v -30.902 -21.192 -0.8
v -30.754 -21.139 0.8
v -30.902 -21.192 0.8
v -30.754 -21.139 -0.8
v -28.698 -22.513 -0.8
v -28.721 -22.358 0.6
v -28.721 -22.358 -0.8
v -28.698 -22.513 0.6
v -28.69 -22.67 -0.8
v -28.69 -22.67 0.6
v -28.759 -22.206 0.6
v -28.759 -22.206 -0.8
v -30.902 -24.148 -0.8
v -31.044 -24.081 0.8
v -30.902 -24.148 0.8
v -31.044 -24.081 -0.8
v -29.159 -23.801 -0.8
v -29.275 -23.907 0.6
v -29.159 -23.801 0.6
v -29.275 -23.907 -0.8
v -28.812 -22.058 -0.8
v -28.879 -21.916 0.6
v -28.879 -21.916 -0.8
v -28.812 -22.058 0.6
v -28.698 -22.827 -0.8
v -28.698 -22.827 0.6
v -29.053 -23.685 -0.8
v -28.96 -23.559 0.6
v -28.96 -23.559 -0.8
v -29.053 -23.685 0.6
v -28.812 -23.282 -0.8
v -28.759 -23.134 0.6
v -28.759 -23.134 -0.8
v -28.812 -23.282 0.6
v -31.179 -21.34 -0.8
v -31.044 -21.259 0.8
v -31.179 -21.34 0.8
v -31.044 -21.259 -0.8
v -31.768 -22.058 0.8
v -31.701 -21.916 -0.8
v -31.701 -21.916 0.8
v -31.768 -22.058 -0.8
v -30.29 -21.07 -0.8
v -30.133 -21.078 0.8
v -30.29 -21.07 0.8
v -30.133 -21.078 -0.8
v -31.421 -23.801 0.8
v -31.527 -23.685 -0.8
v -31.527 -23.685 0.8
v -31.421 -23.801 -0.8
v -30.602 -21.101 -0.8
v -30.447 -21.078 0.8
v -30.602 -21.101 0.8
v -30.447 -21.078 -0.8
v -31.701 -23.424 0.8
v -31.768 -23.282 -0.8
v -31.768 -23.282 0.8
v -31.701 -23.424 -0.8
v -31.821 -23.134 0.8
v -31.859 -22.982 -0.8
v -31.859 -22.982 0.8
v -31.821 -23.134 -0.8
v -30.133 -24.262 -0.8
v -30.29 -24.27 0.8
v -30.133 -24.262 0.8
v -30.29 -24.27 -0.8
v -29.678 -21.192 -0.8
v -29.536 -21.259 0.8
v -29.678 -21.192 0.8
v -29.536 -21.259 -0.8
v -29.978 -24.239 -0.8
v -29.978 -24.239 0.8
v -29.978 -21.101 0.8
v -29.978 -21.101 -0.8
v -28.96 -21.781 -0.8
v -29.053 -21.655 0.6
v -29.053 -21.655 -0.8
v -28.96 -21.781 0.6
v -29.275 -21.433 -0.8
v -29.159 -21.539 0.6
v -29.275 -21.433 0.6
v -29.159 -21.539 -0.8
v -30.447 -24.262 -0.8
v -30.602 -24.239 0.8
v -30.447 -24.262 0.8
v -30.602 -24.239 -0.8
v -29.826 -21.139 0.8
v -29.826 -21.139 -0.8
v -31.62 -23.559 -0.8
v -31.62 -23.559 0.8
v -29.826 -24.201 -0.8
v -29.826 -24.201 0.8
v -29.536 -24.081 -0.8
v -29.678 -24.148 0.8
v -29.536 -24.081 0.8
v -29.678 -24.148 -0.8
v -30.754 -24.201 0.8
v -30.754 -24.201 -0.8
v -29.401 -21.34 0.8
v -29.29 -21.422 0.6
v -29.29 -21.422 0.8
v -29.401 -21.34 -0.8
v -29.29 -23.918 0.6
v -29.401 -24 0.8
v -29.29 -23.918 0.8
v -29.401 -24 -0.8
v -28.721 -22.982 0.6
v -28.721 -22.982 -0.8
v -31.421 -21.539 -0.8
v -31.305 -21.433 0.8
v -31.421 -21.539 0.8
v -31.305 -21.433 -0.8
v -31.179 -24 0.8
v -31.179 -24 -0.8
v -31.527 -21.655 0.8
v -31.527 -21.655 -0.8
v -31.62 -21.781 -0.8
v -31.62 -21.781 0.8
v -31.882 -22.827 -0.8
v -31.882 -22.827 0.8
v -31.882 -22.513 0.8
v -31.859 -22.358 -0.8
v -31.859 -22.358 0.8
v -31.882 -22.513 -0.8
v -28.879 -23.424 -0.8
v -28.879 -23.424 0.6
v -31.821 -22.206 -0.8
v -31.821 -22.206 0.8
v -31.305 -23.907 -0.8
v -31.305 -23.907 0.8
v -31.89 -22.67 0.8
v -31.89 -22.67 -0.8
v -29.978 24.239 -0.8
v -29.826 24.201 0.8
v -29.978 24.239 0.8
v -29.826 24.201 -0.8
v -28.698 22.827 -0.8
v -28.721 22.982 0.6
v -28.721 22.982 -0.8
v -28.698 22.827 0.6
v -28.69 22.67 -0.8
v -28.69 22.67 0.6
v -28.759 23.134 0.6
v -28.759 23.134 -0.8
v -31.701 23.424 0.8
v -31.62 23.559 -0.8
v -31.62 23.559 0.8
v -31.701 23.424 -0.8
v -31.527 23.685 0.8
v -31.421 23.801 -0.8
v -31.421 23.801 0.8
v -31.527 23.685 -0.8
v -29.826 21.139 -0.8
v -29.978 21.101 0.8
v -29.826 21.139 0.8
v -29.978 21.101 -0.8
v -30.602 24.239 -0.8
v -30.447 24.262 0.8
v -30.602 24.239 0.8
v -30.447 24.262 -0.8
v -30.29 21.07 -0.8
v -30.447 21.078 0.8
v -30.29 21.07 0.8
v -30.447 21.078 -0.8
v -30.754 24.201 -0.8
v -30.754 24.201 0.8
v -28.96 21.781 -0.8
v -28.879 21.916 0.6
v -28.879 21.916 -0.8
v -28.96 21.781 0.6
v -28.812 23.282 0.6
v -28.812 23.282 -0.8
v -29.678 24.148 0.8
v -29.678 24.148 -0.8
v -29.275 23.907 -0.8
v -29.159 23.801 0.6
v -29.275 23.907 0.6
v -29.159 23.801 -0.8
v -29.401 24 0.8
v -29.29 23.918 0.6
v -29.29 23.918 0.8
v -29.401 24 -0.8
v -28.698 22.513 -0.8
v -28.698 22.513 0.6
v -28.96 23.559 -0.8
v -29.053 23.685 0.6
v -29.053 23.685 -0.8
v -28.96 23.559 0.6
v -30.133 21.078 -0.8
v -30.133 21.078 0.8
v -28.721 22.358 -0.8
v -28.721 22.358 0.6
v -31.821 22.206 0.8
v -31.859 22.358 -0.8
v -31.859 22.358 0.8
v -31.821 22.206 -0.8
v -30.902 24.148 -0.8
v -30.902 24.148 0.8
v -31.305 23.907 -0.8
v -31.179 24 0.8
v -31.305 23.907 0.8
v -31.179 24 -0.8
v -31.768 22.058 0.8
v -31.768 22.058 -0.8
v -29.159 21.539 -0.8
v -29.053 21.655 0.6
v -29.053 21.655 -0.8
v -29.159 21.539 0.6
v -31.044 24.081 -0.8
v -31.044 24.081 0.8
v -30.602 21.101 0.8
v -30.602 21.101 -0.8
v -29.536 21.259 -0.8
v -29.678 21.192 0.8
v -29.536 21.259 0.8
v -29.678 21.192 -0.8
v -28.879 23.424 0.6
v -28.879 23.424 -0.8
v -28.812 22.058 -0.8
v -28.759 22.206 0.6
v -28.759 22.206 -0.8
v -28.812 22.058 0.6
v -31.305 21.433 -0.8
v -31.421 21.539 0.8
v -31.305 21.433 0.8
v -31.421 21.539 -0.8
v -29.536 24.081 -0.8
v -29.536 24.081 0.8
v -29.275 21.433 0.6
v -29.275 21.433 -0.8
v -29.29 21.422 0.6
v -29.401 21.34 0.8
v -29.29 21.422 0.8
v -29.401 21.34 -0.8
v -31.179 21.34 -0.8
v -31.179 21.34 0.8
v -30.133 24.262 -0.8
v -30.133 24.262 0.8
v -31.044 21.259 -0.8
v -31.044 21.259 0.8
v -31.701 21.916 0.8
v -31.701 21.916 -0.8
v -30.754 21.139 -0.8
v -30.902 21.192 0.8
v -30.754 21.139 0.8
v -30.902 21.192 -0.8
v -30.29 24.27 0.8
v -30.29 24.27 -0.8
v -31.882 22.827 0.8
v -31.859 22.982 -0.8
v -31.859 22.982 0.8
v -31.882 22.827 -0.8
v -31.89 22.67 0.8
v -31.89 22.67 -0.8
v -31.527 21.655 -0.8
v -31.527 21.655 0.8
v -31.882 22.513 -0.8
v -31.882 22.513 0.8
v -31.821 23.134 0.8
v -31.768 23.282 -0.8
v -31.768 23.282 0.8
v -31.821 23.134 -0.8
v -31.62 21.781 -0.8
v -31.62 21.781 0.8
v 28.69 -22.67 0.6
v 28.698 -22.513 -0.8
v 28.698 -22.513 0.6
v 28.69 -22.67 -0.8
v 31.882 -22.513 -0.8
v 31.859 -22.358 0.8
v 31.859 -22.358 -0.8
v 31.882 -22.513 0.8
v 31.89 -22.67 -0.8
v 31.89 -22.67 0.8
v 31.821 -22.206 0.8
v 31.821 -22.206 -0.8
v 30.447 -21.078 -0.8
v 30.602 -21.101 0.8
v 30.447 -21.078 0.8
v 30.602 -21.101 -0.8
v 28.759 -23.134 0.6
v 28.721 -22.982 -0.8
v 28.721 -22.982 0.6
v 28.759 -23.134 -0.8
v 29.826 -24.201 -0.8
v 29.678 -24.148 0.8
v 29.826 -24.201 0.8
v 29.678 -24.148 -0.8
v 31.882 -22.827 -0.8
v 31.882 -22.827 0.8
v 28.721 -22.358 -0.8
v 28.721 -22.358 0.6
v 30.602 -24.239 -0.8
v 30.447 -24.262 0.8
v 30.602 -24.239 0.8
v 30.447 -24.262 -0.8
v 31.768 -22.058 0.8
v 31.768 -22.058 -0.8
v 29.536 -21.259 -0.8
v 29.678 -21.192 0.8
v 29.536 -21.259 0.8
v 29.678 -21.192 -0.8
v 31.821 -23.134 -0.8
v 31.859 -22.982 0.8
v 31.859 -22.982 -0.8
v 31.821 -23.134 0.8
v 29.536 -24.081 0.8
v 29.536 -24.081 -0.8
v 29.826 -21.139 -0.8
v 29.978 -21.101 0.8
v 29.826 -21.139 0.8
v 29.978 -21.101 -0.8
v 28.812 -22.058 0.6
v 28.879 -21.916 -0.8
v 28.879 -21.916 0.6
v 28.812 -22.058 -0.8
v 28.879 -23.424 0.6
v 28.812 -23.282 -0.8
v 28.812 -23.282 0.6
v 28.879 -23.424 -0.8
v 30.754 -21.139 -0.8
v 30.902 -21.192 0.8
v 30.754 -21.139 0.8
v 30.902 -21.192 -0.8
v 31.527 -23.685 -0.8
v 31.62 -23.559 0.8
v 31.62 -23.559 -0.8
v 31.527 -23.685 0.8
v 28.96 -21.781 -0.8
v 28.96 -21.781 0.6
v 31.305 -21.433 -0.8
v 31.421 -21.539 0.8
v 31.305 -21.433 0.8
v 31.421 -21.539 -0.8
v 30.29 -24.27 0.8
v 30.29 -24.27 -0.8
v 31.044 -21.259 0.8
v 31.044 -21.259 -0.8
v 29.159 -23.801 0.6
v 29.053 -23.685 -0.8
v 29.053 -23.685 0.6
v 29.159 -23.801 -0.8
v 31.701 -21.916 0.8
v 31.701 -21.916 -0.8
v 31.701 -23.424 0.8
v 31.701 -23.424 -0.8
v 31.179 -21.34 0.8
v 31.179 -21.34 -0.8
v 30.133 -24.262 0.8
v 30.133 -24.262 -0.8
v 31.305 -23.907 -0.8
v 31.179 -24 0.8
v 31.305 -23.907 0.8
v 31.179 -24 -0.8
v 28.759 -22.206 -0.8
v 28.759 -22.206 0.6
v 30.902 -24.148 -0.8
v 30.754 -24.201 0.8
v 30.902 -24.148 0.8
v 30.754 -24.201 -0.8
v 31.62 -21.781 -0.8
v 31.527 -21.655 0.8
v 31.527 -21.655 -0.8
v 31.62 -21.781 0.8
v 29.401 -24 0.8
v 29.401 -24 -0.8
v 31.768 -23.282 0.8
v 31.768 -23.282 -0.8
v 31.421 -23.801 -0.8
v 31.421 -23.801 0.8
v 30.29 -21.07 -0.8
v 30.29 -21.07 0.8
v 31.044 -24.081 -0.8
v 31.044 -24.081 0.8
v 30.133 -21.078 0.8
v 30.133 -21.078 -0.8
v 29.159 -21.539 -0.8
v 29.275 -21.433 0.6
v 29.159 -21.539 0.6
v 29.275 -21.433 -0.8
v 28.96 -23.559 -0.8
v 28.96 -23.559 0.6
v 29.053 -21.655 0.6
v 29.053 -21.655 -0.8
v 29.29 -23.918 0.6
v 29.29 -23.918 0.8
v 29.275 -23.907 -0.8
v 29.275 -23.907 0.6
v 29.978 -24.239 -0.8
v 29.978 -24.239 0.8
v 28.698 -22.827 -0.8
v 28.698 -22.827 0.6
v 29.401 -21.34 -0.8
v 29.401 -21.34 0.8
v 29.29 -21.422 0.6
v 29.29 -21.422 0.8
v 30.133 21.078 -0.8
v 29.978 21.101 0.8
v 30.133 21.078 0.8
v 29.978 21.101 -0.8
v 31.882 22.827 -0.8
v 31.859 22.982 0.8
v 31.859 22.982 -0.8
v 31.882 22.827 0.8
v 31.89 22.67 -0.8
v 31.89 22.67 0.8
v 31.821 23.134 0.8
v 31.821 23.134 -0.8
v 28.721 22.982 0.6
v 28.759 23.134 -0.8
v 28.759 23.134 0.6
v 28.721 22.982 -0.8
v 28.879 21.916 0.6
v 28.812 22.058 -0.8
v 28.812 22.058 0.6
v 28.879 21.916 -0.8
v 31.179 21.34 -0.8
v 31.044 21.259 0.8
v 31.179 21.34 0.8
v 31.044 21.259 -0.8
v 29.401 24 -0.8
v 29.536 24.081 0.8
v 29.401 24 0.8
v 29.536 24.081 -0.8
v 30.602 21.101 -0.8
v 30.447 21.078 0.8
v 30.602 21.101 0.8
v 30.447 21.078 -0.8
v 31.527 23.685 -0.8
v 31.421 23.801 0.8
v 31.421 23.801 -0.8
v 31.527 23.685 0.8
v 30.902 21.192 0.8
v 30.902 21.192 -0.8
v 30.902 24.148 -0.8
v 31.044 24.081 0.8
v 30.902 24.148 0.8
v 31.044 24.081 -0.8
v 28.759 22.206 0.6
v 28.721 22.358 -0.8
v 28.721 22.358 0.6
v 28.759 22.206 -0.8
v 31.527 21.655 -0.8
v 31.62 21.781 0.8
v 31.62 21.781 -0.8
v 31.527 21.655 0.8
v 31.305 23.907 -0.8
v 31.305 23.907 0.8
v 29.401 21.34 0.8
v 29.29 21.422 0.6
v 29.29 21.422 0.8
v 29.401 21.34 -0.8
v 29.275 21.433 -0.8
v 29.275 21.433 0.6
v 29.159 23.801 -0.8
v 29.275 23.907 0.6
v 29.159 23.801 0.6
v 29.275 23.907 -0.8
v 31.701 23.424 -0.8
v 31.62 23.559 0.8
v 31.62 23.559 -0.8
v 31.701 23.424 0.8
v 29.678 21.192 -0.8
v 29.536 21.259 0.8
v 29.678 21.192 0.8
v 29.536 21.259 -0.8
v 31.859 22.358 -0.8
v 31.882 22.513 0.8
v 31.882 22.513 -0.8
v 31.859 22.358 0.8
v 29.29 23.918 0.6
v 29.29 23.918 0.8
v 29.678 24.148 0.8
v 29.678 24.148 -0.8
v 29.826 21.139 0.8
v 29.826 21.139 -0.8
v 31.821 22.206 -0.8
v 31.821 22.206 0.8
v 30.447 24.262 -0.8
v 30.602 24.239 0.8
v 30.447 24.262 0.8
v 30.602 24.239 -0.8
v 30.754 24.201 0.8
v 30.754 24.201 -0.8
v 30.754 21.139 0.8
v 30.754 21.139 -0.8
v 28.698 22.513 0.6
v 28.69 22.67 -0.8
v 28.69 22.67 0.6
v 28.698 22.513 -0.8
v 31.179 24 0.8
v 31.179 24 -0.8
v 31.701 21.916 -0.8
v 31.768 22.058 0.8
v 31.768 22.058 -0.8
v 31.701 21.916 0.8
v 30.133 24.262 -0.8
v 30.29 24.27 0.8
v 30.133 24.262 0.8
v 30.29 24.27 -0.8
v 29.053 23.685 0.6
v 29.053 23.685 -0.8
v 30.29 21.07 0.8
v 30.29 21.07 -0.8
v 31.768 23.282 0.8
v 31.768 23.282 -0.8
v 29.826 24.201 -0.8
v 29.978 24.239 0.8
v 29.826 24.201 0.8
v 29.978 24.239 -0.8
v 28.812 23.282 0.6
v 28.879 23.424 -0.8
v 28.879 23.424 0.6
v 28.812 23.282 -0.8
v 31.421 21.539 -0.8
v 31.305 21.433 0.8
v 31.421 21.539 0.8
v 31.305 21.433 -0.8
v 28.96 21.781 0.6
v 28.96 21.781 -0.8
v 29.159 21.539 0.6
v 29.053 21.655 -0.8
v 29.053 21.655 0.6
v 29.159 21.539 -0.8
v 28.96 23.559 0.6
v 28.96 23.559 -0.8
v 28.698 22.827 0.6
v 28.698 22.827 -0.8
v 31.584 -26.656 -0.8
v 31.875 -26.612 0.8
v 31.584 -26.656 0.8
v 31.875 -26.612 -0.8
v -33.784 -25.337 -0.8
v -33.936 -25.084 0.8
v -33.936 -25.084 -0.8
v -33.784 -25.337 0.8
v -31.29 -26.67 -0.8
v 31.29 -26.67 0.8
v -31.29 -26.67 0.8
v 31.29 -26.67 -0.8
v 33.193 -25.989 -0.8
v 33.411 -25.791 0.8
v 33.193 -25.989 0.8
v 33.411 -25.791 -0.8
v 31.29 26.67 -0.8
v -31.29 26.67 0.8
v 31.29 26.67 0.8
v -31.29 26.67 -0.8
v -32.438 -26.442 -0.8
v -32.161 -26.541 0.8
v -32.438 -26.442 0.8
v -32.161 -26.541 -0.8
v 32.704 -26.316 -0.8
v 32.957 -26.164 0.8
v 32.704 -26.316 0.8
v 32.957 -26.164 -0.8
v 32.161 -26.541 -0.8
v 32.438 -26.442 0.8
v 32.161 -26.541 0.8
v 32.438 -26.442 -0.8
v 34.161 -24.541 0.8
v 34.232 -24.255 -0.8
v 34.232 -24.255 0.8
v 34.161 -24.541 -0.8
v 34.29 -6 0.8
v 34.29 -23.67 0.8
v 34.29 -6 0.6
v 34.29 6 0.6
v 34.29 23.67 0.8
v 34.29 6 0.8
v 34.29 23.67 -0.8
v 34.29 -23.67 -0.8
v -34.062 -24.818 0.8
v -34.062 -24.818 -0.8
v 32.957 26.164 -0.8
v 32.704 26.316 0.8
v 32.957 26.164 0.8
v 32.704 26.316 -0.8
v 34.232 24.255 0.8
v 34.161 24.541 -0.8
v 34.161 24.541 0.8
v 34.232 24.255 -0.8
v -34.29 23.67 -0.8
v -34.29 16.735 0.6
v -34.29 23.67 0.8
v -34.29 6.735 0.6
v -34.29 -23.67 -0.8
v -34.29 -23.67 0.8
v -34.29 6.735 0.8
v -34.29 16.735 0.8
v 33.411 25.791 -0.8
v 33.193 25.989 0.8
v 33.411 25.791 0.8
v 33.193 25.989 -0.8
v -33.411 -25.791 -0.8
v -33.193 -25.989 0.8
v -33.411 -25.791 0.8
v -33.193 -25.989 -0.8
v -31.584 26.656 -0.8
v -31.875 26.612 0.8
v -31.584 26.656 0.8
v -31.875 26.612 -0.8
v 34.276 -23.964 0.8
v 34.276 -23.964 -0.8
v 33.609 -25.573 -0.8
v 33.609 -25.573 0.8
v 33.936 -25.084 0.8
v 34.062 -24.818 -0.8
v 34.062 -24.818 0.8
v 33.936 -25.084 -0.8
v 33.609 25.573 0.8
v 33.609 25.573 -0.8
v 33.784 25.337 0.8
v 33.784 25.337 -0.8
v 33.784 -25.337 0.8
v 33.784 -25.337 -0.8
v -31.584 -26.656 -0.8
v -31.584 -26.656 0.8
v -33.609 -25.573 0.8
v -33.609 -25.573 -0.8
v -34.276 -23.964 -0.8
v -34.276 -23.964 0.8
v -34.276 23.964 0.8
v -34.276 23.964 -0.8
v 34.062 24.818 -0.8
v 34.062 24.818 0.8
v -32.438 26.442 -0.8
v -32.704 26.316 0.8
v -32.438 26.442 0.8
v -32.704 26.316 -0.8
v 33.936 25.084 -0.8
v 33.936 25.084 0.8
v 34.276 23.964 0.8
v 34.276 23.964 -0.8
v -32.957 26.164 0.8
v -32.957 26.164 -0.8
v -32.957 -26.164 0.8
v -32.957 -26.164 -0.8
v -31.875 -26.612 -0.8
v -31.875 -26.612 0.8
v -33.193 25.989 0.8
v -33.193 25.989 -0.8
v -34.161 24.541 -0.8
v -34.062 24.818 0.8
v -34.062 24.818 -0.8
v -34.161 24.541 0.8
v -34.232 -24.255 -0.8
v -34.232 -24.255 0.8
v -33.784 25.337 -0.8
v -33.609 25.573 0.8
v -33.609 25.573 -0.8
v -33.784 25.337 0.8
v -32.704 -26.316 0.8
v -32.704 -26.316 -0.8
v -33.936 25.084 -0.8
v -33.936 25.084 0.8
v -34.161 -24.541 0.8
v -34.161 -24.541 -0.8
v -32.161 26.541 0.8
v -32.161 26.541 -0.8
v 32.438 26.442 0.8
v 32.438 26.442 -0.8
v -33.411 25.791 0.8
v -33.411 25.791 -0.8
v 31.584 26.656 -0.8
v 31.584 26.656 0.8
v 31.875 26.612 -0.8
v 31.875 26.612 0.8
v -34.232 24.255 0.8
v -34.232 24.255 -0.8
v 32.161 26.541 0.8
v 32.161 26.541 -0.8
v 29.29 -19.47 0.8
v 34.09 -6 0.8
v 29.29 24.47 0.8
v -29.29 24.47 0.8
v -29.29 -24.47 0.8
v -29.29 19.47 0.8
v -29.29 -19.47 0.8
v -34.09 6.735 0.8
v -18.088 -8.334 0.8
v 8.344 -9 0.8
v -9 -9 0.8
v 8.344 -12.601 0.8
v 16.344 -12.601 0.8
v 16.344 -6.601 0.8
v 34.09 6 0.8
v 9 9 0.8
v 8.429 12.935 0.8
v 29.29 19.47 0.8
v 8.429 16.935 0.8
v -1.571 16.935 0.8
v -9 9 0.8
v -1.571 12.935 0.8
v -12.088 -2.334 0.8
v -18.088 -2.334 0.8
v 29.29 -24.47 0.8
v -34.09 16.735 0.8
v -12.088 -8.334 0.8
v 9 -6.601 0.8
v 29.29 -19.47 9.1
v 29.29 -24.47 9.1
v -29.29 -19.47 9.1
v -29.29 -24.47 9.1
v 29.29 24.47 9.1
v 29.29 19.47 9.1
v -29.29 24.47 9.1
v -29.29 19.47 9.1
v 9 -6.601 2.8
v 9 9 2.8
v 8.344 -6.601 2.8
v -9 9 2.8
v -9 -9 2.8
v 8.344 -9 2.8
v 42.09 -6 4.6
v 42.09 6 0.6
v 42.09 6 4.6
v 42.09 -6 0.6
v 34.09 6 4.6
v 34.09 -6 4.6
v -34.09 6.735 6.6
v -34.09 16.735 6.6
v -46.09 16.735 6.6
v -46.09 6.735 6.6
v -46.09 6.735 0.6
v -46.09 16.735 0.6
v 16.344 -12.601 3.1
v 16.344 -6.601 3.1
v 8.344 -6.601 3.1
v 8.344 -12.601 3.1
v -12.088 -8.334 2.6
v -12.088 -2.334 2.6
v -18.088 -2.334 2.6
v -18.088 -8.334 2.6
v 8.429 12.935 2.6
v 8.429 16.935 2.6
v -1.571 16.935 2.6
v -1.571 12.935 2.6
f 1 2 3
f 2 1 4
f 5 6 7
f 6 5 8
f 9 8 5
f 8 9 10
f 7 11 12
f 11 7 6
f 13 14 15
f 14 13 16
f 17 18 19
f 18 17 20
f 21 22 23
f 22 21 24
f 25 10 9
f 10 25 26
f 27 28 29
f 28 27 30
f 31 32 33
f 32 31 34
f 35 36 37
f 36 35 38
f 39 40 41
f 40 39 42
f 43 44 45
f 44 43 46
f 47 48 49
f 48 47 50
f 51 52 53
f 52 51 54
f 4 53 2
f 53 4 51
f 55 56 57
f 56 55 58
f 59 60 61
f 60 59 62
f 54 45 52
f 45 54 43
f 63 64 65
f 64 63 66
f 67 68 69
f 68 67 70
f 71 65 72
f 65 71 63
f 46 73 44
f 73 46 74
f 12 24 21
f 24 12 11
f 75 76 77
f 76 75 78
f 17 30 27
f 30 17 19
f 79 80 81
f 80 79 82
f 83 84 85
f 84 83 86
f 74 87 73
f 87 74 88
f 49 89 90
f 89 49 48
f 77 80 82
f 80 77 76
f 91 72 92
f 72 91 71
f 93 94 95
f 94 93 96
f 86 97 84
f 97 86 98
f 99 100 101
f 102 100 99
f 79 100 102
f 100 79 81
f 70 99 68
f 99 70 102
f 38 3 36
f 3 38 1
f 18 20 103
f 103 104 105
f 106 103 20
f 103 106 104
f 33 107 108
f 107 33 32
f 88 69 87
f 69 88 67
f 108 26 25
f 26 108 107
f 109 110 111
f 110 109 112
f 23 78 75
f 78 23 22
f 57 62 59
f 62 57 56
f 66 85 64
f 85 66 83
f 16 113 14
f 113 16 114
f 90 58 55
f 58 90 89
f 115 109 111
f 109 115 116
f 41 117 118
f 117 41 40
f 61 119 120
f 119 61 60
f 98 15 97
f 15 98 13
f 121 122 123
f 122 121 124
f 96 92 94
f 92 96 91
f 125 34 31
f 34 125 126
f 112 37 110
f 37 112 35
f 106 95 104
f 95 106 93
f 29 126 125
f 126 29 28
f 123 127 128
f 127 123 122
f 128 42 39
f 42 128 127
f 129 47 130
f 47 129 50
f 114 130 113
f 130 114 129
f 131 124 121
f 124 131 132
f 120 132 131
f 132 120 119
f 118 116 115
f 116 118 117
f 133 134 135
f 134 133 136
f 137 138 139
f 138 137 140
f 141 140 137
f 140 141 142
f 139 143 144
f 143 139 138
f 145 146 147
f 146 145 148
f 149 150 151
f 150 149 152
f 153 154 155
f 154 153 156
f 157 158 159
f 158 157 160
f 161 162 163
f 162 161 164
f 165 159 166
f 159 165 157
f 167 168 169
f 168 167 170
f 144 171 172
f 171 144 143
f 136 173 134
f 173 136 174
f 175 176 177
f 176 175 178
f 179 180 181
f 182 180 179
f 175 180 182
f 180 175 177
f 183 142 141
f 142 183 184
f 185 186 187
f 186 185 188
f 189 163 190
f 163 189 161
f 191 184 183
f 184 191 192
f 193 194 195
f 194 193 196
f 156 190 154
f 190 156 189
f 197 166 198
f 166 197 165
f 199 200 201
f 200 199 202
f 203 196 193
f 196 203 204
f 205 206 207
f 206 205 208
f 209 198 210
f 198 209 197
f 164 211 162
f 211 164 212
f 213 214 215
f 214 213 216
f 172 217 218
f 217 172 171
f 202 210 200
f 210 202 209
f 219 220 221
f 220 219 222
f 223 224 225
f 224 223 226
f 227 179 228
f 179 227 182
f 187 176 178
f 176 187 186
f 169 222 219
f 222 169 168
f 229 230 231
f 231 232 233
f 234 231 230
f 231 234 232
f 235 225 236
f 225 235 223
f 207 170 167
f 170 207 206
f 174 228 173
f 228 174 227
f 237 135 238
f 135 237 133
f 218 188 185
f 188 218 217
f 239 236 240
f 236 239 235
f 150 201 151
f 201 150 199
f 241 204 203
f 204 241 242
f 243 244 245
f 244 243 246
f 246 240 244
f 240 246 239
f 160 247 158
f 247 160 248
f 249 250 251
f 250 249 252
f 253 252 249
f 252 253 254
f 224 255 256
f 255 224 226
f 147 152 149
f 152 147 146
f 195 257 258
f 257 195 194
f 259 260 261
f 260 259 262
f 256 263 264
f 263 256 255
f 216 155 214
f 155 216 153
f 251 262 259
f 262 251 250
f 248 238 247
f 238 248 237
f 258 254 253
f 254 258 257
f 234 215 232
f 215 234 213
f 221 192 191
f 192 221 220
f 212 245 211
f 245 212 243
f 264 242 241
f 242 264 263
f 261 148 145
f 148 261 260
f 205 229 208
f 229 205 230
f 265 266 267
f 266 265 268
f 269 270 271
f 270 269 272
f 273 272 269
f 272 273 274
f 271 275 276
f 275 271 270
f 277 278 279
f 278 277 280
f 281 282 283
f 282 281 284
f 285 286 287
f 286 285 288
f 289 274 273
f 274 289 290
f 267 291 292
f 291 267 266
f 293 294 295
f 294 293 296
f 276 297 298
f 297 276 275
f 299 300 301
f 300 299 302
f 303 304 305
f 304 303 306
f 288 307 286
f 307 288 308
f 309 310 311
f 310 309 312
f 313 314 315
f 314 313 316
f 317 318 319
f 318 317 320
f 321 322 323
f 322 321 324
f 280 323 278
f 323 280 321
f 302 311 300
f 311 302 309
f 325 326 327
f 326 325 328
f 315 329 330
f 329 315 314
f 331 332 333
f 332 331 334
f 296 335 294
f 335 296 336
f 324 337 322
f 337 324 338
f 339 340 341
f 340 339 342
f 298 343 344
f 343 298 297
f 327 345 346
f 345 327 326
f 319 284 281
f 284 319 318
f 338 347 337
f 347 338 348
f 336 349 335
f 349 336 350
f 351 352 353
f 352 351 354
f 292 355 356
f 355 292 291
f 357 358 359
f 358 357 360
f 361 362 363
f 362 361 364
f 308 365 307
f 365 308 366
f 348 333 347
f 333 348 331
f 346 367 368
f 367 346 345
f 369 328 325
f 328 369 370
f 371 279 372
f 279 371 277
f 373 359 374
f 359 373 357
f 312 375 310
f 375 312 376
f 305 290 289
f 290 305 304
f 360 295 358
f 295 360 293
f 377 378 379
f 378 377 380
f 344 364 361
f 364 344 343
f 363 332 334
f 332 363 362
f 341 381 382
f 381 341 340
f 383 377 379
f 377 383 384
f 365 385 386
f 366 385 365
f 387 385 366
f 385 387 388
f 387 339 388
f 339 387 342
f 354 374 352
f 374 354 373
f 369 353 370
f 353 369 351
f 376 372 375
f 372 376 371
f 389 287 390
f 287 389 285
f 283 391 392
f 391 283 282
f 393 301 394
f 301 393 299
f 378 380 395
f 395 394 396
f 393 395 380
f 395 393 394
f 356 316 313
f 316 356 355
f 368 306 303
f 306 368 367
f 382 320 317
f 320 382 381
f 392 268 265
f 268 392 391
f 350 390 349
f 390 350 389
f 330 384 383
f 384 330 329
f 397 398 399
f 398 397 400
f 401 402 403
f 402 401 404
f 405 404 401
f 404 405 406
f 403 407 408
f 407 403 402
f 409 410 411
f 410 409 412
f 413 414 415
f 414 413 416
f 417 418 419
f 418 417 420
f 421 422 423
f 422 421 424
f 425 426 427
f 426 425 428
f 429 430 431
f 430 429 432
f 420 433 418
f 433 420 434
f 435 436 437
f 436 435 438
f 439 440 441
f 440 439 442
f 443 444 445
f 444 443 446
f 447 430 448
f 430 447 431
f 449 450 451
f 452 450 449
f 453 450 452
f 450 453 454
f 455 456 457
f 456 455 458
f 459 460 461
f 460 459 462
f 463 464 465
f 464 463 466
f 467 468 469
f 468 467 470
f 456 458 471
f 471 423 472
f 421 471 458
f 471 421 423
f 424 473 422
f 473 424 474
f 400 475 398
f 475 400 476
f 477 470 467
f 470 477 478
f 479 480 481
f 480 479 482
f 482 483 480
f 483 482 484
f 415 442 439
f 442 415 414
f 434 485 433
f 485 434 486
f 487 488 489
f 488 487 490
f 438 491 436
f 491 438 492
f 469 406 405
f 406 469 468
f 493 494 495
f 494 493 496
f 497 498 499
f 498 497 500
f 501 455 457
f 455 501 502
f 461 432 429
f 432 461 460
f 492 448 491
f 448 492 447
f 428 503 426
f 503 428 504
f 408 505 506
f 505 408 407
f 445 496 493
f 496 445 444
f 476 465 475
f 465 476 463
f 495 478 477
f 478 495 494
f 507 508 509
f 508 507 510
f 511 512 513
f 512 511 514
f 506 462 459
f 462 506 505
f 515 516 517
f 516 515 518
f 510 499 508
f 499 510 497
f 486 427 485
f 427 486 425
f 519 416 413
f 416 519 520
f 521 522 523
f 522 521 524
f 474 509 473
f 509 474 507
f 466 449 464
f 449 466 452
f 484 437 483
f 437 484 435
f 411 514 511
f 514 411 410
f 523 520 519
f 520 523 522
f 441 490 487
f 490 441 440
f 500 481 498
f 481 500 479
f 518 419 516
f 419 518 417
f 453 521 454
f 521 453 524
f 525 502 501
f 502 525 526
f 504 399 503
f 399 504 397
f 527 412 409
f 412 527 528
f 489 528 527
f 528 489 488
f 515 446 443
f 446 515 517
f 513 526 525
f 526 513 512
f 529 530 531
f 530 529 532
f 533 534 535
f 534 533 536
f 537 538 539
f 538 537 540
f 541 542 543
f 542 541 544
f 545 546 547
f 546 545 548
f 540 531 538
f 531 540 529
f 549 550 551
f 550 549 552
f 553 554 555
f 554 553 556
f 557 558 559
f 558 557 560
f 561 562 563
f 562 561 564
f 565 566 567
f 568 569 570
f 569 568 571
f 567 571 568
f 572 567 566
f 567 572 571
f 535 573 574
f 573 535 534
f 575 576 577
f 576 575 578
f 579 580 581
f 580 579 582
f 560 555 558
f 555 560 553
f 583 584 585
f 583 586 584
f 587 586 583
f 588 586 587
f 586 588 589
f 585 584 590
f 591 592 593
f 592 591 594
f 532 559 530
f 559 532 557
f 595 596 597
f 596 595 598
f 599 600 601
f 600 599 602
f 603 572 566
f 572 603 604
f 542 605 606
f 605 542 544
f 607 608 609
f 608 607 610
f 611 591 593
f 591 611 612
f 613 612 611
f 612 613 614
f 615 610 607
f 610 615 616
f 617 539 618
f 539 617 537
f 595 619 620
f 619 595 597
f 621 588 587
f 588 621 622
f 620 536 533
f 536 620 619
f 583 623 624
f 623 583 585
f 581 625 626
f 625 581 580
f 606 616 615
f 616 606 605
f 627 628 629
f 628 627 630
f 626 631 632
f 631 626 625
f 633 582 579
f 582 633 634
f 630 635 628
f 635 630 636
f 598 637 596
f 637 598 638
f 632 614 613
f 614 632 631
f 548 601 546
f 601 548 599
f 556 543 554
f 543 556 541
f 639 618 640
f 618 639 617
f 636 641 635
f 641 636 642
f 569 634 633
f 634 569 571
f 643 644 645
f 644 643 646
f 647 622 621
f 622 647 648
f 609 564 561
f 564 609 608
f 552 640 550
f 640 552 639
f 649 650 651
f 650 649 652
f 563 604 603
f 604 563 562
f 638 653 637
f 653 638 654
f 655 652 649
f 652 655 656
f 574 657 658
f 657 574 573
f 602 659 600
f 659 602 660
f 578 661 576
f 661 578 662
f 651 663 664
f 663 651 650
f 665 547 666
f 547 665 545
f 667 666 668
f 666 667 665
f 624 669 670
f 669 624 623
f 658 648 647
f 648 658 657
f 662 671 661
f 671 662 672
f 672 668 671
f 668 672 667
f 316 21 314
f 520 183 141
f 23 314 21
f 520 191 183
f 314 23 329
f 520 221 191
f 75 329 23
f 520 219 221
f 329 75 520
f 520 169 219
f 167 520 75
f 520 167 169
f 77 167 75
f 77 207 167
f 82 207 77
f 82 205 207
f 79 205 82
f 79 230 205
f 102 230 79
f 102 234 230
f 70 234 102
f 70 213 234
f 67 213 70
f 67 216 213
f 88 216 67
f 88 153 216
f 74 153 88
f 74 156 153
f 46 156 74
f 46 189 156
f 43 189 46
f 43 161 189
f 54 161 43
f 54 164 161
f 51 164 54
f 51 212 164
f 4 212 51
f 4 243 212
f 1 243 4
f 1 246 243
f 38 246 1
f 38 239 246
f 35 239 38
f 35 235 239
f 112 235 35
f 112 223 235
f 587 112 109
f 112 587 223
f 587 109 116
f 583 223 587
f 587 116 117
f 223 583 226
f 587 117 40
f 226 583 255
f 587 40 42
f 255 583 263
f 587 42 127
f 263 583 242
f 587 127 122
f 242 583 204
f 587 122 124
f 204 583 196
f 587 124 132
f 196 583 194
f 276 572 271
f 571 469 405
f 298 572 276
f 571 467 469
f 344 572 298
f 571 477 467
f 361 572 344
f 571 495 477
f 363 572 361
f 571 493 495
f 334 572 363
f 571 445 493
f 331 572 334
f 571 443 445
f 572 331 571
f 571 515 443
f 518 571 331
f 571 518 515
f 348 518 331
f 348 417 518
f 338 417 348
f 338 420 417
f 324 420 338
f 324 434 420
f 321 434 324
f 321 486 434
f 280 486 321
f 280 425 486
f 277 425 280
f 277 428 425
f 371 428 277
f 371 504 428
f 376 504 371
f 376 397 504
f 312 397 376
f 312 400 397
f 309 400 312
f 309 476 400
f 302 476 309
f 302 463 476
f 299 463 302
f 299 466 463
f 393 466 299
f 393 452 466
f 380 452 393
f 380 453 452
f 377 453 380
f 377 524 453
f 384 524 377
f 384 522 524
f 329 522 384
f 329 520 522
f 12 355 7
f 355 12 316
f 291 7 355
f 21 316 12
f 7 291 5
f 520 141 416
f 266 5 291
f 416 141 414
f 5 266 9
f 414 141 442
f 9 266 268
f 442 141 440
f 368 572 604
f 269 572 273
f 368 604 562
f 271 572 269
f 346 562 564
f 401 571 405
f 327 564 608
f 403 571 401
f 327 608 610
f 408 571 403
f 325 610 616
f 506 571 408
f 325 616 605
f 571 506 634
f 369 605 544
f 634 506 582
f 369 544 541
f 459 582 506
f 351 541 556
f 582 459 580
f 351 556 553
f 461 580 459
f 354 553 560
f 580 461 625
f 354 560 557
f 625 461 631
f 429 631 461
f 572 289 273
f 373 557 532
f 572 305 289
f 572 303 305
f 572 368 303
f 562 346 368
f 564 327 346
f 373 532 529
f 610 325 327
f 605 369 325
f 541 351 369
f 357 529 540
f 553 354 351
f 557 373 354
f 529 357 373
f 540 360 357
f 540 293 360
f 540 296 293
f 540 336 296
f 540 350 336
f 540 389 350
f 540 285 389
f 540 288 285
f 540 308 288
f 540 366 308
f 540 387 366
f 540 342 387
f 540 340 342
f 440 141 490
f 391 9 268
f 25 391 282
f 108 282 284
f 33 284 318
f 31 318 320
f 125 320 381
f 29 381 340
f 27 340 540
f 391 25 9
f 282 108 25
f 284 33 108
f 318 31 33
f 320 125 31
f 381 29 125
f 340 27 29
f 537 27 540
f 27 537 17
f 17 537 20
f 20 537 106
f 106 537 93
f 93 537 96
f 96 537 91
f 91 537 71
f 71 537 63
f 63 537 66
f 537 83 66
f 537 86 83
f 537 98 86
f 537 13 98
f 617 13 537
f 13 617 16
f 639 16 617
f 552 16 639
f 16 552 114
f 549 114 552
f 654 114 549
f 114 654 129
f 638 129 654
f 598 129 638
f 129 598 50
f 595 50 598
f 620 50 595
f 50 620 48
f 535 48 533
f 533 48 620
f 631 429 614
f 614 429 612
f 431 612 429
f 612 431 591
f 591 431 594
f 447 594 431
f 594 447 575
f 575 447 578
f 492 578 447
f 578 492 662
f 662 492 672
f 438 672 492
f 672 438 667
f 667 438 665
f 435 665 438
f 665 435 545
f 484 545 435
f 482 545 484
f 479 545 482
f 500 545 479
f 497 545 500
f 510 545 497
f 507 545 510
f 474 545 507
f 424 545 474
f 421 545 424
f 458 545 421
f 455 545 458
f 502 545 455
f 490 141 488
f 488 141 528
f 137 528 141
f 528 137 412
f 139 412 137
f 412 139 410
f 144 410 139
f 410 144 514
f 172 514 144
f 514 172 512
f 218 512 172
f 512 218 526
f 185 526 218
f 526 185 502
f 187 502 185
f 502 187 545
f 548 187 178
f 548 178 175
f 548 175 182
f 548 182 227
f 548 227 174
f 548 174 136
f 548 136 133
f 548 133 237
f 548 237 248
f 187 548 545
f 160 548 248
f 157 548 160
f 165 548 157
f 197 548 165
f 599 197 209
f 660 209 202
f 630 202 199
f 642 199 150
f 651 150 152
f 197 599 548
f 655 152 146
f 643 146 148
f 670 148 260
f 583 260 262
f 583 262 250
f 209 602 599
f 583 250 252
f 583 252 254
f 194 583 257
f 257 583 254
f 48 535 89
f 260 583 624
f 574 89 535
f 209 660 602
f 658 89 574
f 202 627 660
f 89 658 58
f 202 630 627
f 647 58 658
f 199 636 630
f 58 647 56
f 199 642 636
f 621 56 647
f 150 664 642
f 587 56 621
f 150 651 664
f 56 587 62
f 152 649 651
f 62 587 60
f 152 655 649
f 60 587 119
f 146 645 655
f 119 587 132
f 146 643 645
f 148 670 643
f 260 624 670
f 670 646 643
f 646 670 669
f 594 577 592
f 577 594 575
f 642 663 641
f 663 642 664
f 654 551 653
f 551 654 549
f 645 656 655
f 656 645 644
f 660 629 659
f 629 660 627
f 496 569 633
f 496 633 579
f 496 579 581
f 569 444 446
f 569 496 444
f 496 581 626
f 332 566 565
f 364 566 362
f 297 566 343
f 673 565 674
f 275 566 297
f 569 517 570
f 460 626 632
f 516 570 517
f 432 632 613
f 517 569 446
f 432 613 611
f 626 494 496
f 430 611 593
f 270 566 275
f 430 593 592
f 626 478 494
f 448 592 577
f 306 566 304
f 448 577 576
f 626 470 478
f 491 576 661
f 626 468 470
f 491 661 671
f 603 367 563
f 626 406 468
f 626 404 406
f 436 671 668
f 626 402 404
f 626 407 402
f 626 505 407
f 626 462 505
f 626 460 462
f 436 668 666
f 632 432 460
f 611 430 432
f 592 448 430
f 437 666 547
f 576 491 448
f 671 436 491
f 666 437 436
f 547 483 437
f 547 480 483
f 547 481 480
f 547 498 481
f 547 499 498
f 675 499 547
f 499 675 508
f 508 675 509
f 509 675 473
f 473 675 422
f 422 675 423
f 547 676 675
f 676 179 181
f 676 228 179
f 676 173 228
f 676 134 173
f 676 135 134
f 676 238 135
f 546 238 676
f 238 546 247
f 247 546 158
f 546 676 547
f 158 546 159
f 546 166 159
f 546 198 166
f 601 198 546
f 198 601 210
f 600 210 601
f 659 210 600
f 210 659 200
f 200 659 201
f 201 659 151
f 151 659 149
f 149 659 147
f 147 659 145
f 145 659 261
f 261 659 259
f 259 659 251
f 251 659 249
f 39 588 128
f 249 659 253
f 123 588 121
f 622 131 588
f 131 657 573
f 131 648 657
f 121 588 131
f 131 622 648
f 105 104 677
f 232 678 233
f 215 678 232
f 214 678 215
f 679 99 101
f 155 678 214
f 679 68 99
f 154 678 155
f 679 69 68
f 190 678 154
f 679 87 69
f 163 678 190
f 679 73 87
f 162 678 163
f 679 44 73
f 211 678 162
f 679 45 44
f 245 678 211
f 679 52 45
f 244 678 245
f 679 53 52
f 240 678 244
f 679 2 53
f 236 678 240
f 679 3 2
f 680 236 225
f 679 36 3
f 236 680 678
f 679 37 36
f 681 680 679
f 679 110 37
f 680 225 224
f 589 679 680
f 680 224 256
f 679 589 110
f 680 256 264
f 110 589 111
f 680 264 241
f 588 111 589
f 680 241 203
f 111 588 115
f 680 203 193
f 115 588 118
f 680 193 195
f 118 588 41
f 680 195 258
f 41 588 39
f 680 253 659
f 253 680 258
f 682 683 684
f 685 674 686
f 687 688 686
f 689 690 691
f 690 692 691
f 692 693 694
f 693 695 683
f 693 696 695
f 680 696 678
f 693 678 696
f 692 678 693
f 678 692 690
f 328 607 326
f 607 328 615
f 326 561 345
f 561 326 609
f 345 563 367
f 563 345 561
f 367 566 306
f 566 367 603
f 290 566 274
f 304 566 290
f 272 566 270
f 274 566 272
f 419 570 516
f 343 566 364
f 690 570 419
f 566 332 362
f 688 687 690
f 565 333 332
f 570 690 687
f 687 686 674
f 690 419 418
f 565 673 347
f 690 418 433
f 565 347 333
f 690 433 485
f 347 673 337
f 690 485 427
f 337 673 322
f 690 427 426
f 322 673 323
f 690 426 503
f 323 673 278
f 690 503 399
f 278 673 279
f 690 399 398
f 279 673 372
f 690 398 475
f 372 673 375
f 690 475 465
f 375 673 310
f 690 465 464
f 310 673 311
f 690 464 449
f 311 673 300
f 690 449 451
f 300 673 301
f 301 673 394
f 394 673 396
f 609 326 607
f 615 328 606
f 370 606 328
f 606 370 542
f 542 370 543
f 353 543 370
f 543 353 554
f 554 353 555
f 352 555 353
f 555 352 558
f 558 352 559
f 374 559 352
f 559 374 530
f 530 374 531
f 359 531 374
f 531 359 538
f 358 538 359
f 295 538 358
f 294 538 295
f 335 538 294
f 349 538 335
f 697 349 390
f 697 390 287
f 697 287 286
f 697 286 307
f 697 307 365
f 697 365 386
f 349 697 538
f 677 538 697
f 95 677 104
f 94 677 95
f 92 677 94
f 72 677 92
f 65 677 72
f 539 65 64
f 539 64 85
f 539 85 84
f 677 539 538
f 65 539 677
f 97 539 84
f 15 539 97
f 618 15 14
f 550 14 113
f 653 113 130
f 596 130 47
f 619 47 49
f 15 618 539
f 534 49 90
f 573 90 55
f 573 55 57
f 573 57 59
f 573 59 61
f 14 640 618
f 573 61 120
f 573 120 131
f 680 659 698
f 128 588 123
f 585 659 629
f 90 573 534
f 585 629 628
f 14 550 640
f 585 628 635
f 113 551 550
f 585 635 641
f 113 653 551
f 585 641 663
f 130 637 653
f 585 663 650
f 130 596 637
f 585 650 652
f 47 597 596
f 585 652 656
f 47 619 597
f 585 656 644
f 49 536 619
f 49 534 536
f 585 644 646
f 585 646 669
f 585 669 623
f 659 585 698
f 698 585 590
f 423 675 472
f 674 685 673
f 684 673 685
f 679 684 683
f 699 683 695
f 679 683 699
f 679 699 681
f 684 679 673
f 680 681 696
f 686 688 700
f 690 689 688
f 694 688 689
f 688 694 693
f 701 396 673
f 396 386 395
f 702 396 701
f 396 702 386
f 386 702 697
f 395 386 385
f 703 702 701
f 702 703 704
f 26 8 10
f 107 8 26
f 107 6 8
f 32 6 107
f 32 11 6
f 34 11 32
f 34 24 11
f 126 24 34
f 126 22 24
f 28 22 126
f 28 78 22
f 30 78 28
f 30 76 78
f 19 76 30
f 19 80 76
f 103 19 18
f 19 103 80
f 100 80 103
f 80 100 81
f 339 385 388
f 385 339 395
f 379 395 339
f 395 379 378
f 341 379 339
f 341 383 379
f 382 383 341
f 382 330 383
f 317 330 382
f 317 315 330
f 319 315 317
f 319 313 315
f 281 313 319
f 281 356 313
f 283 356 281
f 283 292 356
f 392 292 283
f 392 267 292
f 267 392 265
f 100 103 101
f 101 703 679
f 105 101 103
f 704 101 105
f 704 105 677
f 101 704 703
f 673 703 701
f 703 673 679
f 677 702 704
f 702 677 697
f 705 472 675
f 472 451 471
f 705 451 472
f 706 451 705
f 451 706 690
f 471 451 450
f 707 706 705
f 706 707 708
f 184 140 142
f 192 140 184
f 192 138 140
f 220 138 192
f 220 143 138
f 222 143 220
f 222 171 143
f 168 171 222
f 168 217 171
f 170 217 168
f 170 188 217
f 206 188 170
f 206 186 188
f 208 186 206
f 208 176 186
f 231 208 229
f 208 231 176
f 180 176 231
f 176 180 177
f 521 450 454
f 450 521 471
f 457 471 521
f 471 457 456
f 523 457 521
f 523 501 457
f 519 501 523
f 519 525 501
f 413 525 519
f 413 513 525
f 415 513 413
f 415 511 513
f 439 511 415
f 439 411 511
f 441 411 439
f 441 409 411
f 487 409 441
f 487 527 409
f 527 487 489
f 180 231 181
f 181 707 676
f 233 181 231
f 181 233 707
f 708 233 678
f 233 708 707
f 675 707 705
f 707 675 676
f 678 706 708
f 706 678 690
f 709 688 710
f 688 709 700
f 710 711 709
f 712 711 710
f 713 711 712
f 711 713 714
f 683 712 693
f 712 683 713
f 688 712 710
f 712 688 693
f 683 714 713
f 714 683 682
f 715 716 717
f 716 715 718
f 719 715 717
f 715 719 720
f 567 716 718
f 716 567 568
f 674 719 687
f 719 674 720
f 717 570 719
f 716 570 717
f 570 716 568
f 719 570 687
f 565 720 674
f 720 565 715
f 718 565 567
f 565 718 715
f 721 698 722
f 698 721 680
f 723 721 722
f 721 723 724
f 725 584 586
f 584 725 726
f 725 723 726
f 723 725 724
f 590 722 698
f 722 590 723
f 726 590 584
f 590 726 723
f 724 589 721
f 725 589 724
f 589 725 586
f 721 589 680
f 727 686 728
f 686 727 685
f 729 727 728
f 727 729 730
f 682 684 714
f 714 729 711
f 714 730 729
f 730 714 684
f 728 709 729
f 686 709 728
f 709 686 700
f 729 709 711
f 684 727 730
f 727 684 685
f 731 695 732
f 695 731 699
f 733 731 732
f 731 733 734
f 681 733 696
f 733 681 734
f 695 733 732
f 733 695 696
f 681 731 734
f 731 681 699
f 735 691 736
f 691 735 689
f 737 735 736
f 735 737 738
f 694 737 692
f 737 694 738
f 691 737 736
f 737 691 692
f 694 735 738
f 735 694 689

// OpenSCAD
$fn = 64;

// Board dimensions (requested)
pcb_length = 68.58;
pcb_width  = 53.34;
pcb_thickness = 1.6;

// Small overlap to guarantee watertight unions
ov = 0.2;

// ---------- Helpers ----------
module rounded_rect_prism(l, w, h, r, center=true) {
    // Rounded rectangle prism using hull of corner cylinders
    translate(center ? [0,0,0] : [l/2, w/2, h/2])
    hull() {
        for (sx = [-1, 1], sy = [-1, 1])
            translate([sx*(l/2 - r), sy*(w/2 - r), 0])
                cylinder(r=r, h=h, center=true);
    }
}

module hole_at(x, y, d, h) {
    translate([x, y, 0]) cylinder(d=d, h=h, center=true);
}

// ---------- Model ----------
module dev_board() {
    // Feature sizes (generic dev board look)
    corner_r = 3.0;

    // Mounting holes (generic 4-corner pattern)
    hole_d = 3.2;
    hole_edge_x = 4.0;
    hole_edge_y = 4.0;

    // Header rails (two long pin headers)
    header_w = 5.0;
    header_h = 8.5;
    header_inset = 2.2; // from PCB edge to header outer edge

    // Central MCU package
    mcu_l = 18.0;
    mcu_w = 18.0;
    mcu_h = 2.2;

    // USB connector (side-mounted)
    usb_w = 12.0;   // along Y
    usb_l = 8.0;    // protrusion along X
    usb_h = 4.0;

    // Power jack / large connector (opposite side, generic)
    jack_w = 10.0;  // along Y
    jack_l = 12.0;  // protrusion along X
    jack_h = 6.0;

    // A couple of small components (caps/regulators)
    comp1 = [8.0, 6.0, 2.5];
    comp2 = [6.0, 6.0, 2.0];
    comp3 = [10.0, 4.0, 2.0];

    union() {
        // PCB with mounting holes (holes are subtracted but model remains one connected solid)
        color([0.0, 0.4, 0.2])
        difference() {
            rounded_rect_prism(pcb_length, pcb_width, pcb_thickness, corner_r, center=true);

            // 4 mounting holes near corners
            for (sx = [-1, 1], sy = [-1, 1]) {
                hole_at(
                    sx*(pcb_length/2 - hole_edge_x),
                    sy*(pcb_width/2  - hole_edge_y),
                    hole_d,
                    pcb_thickness + 2*ov
                );
            }
        }

        // Two long header blocks on top side (connected to PCB with slight overlap)
        color([0.1, 0.1, 0.1])
        for (sy = [-1, 1]) {
            translate([
                0,
                sy*(pcb_width/2 - header_inset - header_w/2),
                pcb_thickness/2 + header_h/2 - ov
            ])
                cube([pcb_length - 10.0, header_w, header_h], center=true);
        }

        // MCU package centered
        color([0.15, 0.15, 0.15])
        translate([0, 0, pcb_thickness/2 + mcu_h/2 - ov])
            cube([mcu_l, mcu_w, mcu_h], center=true);

        // USB connector on +X edge, centered in Y
        color([0.75, 0.75, 0.75])
        translate([
            pcb_length/2 + usb_l/2 - ov,
            0,
            pcb_thickness/2 + usb_h/2 - ov
        ])
            cube([usb_l, usb_w, usb_h], center=true);

        // Large jack on -X edge, offset in Y
        color([0.2, 0.2, 0.2])
        translate([
            -(pcb_length/2 + jack_l/2 - ov),
            pcb_width*0.22,
            pcb_thickness/2 + jack_h/2 - ov
        ])
            cube([jack_l, jack_w, jack_h], center=true);

        // A few small components (top side), placed with formula-based offsets
        color([0.25, 0.25, 0.25])
        translate([
            pcb_length*0.18,
            -(pcb_width*0.18),
            pcb_thickness/2 + comp1[2]/2 - ov
        ])
            cube(comp1, center=true);

        color([0.25, 0.25, 0.25])
        translate([
            -(pcb_length*0.22),
            -(pcb_width*0.10),
            pcb_thickness/2 + comp2[2]/2 - ov
        ])
            cube(comp2, center=true);

        color([0.25, 0.25, 0.25])
        translate([
            pcb_length*0.05,
            pcb_width*0.28,
            pcb_thickness/2 + comp3[2]/2 - ov
        ])
            cube(comp3, center=true);
    }
}

dev_board();
